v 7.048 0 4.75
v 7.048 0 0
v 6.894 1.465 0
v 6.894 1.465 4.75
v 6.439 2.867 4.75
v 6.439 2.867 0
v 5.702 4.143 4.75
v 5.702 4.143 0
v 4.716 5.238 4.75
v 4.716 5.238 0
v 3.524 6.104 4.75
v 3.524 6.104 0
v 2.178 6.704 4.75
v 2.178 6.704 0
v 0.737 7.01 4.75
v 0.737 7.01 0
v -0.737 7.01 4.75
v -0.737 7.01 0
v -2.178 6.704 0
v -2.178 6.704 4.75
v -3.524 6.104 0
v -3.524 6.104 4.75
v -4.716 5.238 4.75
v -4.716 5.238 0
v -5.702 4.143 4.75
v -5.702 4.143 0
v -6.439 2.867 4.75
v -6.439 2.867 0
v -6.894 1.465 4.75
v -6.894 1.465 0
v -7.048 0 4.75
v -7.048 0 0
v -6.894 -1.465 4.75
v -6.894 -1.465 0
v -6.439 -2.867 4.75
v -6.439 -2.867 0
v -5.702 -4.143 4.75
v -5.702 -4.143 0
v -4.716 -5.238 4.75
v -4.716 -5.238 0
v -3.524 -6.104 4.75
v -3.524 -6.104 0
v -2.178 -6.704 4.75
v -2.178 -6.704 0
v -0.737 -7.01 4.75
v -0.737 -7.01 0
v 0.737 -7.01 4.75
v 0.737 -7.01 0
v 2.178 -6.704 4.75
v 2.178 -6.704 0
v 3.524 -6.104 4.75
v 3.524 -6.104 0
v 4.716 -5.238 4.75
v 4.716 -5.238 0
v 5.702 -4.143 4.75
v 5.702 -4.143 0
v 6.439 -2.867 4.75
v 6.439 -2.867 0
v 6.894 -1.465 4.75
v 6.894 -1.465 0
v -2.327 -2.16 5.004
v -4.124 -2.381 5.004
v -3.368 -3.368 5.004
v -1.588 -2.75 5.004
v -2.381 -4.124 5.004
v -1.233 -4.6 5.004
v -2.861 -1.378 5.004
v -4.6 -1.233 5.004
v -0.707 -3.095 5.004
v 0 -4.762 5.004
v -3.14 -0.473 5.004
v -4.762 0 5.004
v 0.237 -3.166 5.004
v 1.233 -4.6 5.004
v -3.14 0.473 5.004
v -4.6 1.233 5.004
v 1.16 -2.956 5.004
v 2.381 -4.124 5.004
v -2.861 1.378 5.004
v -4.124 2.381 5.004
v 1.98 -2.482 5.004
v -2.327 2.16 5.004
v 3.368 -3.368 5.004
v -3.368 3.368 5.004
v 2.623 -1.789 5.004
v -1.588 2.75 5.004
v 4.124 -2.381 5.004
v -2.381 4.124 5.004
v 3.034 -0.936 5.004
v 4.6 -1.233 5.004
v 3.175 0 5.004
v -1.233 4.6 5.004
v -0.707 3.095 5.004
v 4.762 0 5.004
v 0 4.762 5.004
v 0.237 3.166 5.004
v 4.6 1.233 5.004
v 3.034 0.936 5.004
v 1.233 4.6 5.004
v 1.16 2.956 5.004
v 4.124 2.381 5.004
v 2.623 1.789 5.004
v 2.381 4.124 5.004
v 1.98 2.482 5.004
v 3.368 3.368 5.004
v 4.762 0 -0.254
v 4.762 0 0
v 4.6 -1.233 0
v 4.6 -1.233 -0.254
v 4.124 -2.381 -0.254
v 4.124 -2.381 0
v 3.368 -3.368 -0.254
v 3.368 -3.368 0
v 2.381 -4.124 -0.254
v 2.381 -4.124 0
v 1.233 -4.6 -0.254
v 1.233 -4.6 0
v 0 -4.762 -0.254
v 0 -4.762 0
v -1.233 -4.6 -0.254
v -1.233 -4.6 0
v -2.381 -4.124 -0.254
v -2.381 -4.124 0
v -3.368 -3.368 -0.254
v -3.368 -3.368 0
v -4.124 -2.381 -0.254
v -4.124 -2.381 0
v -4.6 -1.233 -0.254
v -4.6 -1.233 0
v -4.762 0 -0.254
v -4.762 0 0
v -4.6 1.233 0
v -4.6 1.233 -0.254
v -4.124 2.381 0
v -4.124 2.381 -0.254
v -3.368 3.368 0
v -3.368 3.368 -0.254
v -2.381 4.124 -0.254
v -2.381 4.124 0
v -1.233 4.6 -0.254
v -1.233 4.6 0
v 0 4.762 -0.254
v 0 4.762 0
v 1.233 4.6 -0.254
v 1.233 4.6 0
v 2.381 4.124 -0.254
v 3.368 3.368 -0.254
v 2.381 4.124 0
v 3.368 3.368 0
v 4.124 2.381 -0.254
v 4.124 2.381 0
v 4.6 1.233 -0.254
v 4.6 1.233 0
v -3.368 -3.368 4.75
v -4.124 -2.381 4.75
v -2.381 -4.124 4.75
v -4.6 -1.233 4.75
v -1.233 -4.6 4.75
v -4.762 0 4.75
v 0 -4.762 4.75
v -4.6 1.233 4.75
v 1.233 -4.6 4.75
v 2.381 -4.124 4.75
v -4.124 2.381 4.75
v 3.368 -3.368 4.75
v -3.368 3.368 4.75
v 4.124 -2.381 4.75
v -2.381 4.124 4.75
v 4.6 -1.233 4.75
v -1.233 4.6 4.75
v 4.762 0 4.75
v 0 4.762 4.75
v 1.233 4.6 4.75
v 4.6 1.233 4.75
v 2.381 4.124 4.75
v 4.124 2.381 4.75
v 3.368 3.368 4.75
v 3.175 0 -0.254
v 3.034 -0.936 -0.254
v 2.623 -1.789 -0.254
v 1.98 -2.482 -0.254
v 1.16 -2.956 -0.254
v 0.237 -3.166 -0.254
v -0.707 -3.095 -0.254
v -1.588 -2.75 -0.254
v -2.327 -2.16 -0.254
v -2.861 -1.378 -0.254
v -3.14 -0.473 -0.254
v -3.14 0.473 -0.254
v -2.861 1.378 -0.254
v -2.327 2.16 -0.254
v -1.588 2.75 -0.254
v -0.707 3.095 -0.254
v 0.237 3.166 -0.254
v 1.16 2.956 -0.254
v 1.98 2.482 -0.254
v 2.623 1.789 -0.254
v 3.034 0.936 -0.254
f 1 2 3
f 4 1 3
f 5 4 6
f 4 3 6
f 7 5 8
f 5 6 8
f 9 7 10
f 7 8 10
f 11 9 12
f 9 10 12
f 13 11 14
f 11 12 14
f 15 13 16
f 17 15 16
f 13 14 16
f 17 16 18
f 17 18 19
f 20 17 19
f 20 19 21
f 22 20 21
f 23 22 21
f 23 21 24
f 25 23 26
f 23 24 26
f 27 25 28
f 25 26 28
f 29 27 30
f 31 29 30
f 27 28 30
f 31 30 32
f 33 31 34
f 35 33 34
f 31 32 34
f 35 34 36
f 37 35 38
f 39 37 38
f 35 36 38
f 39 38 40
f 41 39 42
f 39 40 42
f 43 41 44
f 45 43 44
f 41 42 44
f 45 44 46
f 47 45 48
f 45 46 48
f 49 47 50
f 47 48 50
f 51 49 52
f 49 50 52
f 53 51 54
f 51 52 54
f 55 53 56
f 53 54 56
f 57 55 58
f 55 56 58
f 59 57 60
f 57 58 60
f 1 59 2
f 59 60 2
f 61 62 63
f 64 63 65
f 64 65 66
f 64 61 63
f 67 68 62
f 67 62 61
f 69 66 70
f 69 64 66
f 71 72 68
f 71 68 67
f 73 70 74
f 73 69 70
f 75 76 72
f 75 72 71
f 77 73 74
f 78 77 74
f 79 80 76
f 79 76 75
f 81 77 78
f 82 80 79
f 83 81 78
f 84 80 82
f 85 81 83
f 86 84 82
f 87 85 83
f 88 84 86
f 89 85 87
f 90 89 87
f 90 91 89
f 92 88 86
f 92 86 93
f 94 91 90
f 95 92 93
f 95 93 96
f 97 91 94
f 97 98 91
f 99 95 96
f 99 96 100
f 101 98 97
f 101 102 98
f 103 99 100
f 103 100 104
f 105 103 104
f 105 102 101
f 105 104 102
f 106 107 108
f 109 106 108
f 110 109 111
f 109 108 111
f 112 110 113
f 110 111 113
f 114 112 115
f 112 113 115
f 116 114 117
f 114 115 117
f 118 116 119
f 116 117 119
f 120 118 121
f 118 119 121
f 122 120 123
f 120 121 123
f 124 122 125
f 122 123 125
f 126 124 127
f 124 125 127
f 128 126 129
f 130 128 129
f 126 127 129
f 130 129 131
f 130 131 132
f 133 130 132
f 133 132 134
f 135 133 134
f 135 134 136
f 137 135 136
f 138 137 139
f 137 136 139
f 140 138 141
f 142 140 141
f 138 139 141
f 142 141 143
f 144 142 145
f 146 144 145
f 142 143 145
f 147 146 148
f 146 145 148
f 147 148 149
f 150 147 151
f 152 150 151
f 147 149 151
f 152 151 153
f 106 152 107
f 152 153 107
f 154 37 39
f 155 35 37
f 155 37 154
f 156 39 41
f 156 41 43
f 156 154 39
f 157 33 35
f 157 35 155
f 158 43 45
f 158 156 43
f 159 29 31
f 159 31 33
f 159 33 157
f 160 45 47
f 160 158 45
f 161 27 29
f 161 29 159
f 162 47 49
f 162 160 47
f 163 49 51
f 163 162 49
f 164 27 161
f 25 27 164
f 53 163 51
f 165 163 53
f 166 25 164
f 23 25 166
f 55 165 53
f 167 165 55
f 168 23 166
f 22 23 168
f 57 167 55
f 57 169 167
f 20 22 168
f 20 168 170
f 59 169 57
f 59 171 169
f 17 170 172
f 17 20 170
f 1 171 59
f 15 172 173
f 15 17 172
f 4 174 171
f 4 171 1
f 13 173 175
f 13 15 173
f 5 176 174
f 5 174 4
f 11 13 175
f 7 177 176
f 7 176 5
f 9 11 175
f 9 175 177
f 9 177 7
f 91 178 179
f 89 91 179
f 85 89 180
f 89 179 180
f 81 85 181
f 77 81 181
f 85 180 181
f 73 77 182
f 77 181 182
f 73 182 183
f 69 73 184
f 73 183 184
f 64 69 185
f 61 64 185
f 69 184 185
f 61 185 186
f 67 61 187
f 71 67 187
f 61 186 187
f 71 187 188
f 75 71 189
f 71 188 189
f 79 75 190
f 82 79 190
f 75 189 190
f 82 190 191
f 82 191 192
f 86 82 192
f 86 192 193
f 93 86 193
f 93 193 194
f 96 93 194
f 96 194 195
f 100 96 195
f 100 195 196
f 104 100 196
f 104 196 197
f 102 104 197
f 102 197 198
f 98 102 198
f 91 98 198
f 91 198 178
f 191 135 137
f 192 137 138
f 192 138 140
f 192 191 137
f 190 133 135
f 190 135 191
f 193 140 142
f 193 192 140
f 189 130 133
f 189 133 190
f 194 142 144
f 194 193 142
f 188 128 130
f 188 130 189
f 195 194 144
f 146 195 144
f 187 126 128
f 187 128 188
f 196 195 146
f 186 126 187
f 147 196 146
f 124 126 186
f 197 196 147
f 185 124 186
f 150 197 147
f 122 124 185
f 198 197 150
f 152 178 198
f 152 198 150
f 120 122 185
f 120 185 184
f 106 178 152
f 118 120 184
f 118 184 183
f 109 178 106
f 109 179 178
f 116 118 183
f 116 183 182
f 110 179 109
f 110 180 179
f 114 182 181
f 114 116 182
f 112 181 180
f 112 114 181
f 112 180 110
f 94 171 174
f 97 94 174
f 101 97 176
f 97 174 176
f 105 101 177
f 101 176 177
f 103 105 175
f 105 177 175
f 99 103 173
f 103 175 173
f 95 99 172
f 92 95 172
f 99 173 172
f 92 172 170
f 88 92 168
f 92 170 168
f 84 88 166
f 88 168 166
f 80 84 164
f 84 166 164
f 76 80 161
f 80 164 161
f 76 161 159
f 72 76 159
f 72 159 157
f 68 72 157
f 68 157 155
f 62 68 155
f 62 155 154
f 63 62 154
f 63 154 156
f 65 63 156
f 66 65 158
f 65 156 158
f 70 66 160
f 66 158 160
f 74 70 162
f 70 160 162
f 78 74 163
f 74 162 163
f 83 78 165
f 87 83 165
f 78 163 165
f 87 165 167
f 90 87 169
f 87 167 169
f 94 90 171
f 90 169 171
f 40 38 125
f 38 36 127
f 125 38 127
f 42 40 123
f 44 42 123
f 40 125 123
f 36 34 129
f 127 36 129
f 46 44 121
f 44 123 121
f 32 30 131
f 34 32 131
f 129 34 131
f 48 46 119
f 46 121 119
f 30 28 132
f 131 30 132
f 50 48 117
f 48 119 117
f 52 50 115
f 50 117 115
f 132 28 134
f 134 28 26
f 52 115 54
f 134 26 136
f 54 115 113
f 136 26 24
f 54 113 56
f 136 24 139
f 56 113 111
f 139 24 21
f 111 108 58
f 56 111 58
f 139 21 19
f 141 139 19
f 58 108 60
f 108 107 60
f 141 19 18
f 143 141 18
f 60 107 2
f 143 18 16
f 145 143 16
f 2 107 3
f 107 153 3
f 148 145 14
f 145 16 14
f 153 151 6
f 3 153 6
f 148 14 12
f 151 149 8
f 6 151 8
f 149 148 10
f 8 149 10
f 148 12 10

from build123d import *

# Parameters (mm, degrees)
F0_R     = 7.0485
F1_DEPTH = 4.7498
F2_R     = 4.7625
F3_DEPTH = 0.254
F4_R     = 4.7625
F5_DEPTH = 0.254
F6_R     = 3.175
F7_DEPTH = 5.2588


with BuildPart() as f1:
    # F0 (on Top) → F1 (new body)
    with BuildSketch(Plane.XY):
        Circle(F0_R)
    extrude(amount=F1_DEPTH)

    # F2 (on face) → F3 (join)
    with BuildSketch(Plane(origin=(0, 0, 0), x_dir=(1, 0, 0), z_dir=(0, 0, -1))):
        Circle(F2_R)
    extrude(amount=F3_DEPTH)

    # F4 (on face) → F5 (join)
    with BuildSketch(Plane.XY.offset(4.7498)):
        Circle(F4_R)
    extrude(amount=F5_DEPTH)

    # F6 (on face) → F7 (cut, through all)
    with BuildSketch(Plane(origin=(0, 0, -0.254), x_dir=(1, 0, 0), z_dir=(0, 0, -1))):
        Circle(F6_R)
    extrude(amount=-F7_DEPTH, mode=Mode.SUBTRACT)


solid = f1.part
